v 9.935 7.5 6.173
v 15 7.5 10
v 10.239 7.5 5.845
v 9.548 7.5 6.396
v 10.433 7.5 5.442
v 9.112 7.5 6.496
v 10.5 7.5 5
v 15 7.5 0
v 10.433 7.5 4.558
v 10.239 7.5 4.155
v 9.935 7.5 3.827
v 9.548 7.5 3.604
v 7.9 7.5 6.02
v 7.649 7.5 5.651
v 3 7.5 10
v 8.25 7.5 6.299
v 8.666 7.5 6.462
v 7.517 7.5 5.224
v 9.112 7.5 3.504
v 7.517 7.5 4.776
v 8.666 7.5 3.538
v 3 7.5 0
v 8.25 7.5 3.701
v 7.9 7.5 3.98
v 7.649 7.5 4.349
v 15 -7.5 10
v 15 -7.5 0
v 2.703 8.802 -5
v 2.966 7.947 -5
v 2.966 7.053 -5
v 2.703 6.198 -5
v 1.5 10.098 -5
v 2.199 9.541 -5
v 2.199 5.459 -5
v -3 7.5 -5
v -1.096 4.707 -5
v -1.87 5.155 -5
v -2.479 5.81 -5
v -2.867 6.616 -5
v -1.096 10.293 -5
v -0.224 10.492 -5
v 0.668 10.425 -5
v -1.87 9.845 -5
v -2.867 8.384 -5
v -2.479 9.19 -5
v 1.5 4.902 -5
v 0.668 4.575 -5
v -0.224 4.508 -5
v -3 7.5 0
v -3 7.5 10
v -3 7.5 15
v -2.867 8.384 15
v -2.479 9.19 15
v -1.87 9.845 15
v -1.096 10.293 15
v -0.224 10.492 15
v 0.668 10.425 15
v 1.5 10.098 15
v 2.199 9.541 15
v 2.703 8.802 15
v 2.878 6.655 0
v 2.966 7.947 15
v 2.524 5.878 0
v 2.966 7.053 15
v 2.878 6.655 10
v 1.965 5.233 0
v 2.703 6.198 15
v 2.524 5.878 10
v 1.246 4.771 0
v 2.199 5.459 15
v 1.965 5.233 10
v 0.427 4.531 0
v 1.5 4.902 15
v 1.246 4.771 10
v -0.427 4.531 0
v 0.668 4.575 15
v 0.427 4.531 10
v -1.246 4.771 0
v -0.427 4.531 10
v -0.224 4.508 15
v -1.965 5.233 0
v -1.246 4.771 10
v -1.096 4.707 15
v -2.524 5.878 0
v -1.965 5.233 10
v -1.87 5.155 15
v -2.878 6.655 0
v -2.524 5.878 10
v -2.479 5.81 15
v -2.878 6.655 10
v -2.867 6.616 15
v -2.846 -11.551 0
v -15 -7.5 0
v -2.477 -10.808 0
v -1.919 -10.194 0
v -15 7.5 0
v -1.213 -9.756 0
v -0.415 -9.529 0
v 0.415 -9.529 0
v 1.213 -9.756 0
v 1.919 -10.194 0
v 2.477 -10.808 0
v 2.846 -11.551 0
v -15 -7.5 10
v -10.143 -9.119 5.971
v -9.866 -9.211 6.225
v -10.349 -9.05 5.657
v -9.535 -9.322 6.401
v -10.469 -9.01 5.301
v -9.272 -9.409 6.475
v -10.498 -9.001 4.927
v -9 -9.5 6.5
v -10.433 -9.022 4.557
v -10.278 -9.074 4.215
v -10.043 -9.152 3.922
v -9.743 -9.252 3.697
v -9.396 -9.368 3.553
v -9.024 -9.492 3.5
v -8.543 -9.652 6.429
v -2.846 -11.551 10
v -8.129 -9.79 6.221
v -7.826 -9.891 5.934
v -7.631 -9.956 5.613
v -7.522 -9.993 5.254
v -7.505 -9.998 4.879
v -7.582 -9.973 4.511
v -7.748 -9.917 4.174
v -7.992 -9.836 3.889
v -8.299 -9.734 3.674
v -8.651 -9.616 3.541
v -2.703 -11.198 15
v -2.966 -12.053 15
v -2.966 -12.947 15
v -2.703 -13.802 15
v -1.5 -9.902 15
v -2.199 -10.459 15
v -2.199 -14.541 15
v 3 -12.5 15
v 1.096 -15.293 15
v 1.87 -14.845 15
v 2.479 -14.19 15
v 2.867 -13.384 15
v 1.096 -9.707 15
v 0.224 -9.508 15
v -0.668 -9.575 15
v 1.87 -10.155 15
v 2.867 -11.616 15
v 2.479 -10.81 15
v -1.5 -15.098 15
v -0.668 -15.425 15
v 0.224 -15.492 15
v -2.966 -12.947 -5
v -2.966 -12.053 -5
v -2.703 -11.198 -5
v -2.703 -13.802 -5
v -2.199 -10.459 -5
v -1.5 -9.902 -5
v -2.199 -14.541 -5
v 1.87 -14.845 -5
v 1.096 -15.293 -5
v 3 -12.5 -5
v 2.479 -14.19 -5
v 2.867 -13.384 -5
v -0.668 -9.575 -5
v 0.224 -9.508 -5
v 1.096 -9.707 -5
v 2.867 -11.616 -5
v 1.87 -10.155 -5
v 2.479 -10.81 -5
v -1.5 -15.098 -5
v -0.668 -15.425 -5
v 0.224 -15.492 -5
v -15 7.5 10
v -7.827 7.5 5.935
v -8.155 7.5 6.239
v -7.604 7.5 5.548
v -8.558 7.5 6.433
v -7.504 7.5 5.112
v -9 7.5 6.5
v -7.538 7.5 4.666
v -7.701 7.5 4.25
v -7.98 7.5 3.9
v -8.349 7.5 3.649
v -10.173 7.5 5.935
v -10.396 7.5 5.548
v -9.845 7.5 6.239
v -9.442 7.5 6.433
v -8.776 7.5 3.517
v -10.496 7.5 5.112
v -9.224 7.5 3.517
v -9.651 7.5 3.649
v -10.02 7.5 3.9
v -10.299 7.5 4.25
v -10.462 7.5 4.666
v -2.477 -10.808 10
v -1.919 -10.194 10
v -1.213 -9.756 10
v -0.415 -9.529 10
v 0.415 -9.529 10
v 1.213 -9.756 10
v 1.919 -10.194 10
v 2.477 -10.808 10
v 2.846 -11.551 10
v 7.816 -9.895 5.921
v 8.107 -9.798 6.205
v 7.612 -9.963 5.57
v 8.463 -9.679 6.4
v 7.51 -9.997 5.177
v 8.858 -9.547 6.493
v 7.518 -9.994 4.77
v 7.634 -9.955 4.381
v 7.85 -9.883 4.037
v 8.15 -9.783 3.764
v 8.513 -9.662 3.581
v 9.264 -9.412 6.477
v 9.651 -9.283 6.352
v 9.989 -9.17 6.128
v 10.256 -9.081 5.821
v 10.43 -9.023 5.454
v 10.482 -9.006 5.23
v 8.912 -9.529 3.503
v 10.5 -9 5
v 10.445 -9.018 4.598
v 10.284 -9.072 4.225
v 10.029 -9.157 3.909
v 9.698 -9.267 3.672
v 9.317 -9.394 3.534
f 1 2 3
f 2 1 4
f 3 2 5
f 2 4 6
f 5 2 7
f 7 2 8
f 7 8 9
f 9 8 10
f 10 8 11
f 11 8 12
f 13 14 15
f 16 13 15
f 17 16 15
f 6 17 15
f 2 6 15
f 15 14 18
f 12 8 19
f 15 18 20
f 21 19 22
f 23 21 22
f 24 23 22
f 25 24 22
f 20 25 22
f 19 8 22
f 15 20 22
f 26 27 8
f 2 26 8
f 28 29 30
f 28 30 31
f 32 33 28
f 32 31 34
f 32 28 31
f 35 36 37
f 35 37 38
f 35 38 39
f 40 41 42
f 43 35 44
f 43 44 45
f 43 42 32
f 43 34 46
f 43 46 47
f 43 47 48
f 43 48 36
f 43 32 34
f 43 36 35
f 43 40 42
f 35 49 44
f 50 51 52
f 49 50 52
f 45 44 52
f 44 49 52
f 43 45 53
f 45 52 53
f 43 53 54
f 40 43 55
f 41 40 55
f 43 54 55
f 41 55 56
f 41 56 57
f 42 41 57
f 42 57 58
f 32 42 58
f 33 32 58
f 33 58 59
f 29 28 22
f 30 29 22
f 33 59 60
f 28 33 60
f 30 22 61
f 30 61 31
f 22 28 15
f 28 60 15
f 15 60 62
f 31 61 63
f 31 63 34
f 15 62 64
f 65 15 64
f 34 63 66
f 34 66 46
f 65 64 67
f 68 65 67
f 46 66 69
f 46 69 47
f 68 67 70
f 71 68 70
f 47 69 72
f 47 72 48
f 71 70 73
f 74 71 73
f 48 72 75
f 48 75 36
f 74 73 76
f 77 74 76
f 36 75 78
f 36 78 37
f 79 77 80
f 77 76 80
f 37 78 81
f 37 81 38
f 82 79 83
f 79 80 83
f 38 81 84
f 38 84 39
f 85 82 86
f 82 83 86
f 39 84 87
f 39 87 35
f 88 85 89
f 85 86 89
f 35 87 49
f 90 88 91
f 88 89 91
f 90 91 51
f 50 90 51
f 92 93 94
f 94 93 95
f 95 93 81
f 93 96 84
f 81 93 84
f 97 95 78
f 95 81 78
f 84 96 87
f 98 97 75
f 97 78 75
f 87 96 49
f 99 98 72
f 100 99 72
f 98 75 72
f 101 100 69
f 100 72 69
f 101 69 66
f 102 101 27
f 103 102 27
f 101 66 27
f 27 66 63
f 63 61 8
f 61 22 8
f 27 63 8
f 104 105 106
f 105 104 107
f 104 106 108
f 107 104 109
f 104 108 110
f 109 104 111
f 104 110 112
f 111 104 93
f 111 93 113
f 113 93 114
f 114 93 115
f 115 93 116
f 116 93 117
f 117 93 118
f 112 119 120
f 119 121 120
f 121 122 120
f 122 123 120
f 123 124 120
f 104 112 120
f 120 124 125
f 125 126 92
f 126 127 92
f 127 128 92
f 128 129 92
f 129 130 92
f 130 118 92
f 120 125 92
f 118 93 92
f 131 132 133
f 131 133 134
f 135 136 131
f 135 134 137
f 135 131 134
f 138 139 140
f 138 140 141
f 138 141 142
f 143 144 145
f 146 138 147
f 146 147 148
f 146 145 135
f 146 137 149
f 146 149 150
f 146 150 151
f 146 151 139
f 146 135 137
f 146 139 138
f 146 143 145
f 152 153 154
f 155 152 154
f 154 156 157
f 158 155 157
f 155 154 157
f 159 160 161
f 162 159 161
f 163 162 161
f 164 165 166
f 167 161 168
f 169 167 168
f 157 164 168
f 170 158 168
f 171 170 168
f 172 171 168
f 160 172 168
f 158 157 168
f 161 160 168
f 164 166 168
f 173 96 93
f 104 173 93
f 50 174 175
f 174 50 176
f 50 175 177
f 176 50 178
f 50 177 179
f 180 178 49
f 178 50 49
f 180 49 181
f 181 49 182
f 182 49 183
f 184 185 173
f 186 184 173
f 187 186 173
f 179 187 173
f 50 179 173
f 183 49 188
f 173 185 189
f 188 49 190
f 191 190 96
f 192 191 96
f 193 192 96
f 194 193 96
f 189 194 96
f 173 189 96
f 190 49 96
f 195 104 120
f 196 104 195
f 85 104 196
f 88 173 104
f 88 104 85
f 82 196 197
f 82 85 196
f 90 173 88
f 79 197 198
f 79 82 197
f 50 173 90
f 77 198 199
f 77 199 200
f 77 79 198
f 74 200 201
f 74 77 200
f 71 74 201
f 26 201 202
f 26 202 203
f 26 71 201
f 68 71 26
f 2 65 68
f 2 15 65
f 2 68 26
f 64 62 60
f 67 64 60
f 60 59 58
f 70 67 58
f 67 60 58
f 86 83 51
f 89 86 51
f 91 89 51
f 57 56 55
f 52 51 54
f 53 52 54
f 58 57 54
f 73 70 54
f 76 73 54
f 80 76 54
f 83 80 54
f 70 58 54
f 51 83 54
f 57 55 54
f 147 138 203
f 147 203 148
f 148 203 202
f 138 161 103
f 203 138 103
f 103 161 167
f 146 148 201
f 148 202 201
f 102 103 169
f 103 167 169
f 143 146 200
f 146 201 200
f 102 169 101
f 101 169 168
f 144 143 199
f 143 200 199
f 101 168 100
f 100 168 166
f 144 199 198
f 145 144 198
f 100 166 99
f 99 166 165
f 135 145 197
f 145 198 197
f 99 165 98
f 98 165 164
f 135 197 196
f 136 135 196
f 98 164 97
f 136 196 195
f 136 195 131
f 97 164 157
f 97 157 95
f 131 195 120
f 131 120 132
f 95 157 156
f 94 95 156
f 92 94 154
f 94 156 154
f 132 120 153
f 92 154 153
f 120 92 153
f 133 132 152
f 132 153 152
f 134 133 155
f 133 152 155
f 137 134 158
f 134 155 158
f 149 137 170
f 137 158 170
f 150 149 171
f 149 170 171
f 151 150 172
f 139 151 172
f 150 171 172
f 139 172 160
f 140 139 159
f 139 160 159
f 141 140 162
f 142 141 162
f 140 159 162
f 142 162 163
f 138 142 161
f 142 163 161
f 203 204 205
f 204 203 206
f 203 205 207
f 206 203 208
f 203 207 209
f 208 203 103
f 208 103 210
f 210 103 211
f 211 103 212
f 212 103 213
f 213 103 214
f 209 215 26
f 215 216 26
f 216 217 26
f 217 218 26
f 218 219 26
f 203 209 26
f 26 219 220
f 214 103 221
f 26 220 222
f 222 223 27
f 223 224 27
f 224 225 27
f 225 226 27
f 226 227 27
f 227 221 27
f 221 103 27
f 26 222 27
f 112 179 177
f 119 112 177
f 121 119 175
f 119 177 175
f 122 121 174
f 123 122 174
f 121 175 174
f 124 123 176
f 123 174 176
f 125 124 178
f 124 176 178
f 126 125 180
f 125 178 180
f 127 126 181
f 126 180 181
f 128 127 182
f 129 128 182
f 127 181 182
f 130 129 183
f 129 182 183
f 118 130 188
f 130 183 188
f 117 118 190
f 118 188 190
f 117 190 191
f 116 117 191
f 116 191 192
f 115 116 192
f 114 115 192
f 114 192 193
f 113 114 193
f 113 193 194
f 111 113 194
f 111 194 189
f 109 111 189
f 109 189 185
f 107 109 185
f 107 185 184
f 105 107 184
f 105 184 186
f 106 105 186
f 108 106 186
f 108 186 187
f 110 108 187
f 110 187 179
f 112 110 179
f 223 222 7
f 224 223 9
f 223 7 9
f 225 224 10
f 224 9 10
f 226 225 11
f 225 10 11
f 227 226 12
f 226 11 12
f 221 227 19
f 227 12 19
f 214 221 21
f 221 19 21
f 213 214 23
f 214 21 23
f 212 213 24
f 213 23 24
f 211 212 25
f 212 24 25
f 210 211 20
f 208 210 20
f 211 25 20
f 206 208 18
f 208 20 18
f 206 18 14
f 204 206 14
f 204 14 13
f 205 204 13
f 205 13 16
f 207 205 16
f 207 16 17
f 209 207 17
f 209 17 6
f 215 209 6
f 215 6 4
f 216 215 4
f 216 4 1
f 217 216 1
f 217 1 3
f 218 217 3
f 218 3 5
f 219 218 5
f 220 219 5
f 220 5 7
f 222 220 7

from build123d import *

# Parameters (mm, degrees)
BOSS_EXTRUDE1_DEPTH      = 10
BOSS_EXTRUDE2_DEPTH      = 15
BOSS_EXTRUDE2_DEPTH_BACK = 5
SKETCH2_R                = 1.5
CUT_EXTRUDE1_DEPTH       = 32.288975694
BOSS_EXTRUDE3_DEPTH      = 5
BOSS_EXTRUDE3_DEPTH_BACK = 15
SKETCH3_R                = 3


with BuildPart() as part:
    # Sketch1 → Boss-Extrude1 (new body)
    with BuildSketch(Plane.XY):
        with BuildLine():
            Line((-15, 7.5), (-15, -7.5))
            Line((-15, -7.5), (-2.846049894, -11.551316702))
            ThreePointArc((-2.846049894, -11.551316702), (0, -9.5), (2.846049894, -11.551316702))
            Line((2.846049894, -11.551316702), (15, -7.5))
            Line((15, -7.5), (15, 7.5))
            Line((15, 7.5), (-15, 7.5))
        make_face()
    extrude(amount=BOSS_EXTRUDE1_DEPTH)

    # Sketch1<3> → Boss-Extrude2 (add, two sides: drawn at the far end of the back side and taken through both)
    with BuildSketch(Plane.XY.offset(-BOSS_EXTRUDE2_DEPTH_BACK)):
        with BuildLine():
            ThreePointArc((2.846049894, -11.551316702), (0, -9.5), (-2.846049894, -11.551316702))
            ThreePointArc((-2.846049894, -11.551316702), (-0.480546729, -15.461262373), (3, -12.5))
            ThreePointArc((3, -12.5), (2.961262373, -12.019453271), (2.846049894, -11.551316702))
        make_face()
    extrude(amount=BOSS_EXTRUDE2_DEPTH + BOSS_EXTRUDE2_DEPTH_BACK)

    # Sketch2 → Cut-Extrude1 (cut, through all)
    with BuildSketch(Plane(origin=(0, 7.5, 0), x_dir=(1, 0, 0), z_dir=(0, 1, 0))):
        with Locations((-9, -5)):
            Circle(SKETCH2_R)
        with Locations((9, -5)):
            Circle(SKETCH2_R)
    extrude(amount=-CUT_EXTRUDE1_DEPTH, mode=Mode.SUBTRACT)

    # Sketch3 → Boss-Extrude3 (add, two sides: drawn at the far end of the back side and taken through both)
    with BuildSketch(Plane(origin=(0, 0, 0), x_dir=(-1, 0, 0), z_dir=(0, 0, -1)).offset(-BOSS_EXTRUDE3_DEPTH_BACK)):
        with Locations((0, 7.5)):
            Circle(SKETCH3_R)
    extrude(amount=BOSS_EXTRUDE3_DEPTH + BOSS_EXTRUDE3_DEPTH_BACK)


solid = part.part
